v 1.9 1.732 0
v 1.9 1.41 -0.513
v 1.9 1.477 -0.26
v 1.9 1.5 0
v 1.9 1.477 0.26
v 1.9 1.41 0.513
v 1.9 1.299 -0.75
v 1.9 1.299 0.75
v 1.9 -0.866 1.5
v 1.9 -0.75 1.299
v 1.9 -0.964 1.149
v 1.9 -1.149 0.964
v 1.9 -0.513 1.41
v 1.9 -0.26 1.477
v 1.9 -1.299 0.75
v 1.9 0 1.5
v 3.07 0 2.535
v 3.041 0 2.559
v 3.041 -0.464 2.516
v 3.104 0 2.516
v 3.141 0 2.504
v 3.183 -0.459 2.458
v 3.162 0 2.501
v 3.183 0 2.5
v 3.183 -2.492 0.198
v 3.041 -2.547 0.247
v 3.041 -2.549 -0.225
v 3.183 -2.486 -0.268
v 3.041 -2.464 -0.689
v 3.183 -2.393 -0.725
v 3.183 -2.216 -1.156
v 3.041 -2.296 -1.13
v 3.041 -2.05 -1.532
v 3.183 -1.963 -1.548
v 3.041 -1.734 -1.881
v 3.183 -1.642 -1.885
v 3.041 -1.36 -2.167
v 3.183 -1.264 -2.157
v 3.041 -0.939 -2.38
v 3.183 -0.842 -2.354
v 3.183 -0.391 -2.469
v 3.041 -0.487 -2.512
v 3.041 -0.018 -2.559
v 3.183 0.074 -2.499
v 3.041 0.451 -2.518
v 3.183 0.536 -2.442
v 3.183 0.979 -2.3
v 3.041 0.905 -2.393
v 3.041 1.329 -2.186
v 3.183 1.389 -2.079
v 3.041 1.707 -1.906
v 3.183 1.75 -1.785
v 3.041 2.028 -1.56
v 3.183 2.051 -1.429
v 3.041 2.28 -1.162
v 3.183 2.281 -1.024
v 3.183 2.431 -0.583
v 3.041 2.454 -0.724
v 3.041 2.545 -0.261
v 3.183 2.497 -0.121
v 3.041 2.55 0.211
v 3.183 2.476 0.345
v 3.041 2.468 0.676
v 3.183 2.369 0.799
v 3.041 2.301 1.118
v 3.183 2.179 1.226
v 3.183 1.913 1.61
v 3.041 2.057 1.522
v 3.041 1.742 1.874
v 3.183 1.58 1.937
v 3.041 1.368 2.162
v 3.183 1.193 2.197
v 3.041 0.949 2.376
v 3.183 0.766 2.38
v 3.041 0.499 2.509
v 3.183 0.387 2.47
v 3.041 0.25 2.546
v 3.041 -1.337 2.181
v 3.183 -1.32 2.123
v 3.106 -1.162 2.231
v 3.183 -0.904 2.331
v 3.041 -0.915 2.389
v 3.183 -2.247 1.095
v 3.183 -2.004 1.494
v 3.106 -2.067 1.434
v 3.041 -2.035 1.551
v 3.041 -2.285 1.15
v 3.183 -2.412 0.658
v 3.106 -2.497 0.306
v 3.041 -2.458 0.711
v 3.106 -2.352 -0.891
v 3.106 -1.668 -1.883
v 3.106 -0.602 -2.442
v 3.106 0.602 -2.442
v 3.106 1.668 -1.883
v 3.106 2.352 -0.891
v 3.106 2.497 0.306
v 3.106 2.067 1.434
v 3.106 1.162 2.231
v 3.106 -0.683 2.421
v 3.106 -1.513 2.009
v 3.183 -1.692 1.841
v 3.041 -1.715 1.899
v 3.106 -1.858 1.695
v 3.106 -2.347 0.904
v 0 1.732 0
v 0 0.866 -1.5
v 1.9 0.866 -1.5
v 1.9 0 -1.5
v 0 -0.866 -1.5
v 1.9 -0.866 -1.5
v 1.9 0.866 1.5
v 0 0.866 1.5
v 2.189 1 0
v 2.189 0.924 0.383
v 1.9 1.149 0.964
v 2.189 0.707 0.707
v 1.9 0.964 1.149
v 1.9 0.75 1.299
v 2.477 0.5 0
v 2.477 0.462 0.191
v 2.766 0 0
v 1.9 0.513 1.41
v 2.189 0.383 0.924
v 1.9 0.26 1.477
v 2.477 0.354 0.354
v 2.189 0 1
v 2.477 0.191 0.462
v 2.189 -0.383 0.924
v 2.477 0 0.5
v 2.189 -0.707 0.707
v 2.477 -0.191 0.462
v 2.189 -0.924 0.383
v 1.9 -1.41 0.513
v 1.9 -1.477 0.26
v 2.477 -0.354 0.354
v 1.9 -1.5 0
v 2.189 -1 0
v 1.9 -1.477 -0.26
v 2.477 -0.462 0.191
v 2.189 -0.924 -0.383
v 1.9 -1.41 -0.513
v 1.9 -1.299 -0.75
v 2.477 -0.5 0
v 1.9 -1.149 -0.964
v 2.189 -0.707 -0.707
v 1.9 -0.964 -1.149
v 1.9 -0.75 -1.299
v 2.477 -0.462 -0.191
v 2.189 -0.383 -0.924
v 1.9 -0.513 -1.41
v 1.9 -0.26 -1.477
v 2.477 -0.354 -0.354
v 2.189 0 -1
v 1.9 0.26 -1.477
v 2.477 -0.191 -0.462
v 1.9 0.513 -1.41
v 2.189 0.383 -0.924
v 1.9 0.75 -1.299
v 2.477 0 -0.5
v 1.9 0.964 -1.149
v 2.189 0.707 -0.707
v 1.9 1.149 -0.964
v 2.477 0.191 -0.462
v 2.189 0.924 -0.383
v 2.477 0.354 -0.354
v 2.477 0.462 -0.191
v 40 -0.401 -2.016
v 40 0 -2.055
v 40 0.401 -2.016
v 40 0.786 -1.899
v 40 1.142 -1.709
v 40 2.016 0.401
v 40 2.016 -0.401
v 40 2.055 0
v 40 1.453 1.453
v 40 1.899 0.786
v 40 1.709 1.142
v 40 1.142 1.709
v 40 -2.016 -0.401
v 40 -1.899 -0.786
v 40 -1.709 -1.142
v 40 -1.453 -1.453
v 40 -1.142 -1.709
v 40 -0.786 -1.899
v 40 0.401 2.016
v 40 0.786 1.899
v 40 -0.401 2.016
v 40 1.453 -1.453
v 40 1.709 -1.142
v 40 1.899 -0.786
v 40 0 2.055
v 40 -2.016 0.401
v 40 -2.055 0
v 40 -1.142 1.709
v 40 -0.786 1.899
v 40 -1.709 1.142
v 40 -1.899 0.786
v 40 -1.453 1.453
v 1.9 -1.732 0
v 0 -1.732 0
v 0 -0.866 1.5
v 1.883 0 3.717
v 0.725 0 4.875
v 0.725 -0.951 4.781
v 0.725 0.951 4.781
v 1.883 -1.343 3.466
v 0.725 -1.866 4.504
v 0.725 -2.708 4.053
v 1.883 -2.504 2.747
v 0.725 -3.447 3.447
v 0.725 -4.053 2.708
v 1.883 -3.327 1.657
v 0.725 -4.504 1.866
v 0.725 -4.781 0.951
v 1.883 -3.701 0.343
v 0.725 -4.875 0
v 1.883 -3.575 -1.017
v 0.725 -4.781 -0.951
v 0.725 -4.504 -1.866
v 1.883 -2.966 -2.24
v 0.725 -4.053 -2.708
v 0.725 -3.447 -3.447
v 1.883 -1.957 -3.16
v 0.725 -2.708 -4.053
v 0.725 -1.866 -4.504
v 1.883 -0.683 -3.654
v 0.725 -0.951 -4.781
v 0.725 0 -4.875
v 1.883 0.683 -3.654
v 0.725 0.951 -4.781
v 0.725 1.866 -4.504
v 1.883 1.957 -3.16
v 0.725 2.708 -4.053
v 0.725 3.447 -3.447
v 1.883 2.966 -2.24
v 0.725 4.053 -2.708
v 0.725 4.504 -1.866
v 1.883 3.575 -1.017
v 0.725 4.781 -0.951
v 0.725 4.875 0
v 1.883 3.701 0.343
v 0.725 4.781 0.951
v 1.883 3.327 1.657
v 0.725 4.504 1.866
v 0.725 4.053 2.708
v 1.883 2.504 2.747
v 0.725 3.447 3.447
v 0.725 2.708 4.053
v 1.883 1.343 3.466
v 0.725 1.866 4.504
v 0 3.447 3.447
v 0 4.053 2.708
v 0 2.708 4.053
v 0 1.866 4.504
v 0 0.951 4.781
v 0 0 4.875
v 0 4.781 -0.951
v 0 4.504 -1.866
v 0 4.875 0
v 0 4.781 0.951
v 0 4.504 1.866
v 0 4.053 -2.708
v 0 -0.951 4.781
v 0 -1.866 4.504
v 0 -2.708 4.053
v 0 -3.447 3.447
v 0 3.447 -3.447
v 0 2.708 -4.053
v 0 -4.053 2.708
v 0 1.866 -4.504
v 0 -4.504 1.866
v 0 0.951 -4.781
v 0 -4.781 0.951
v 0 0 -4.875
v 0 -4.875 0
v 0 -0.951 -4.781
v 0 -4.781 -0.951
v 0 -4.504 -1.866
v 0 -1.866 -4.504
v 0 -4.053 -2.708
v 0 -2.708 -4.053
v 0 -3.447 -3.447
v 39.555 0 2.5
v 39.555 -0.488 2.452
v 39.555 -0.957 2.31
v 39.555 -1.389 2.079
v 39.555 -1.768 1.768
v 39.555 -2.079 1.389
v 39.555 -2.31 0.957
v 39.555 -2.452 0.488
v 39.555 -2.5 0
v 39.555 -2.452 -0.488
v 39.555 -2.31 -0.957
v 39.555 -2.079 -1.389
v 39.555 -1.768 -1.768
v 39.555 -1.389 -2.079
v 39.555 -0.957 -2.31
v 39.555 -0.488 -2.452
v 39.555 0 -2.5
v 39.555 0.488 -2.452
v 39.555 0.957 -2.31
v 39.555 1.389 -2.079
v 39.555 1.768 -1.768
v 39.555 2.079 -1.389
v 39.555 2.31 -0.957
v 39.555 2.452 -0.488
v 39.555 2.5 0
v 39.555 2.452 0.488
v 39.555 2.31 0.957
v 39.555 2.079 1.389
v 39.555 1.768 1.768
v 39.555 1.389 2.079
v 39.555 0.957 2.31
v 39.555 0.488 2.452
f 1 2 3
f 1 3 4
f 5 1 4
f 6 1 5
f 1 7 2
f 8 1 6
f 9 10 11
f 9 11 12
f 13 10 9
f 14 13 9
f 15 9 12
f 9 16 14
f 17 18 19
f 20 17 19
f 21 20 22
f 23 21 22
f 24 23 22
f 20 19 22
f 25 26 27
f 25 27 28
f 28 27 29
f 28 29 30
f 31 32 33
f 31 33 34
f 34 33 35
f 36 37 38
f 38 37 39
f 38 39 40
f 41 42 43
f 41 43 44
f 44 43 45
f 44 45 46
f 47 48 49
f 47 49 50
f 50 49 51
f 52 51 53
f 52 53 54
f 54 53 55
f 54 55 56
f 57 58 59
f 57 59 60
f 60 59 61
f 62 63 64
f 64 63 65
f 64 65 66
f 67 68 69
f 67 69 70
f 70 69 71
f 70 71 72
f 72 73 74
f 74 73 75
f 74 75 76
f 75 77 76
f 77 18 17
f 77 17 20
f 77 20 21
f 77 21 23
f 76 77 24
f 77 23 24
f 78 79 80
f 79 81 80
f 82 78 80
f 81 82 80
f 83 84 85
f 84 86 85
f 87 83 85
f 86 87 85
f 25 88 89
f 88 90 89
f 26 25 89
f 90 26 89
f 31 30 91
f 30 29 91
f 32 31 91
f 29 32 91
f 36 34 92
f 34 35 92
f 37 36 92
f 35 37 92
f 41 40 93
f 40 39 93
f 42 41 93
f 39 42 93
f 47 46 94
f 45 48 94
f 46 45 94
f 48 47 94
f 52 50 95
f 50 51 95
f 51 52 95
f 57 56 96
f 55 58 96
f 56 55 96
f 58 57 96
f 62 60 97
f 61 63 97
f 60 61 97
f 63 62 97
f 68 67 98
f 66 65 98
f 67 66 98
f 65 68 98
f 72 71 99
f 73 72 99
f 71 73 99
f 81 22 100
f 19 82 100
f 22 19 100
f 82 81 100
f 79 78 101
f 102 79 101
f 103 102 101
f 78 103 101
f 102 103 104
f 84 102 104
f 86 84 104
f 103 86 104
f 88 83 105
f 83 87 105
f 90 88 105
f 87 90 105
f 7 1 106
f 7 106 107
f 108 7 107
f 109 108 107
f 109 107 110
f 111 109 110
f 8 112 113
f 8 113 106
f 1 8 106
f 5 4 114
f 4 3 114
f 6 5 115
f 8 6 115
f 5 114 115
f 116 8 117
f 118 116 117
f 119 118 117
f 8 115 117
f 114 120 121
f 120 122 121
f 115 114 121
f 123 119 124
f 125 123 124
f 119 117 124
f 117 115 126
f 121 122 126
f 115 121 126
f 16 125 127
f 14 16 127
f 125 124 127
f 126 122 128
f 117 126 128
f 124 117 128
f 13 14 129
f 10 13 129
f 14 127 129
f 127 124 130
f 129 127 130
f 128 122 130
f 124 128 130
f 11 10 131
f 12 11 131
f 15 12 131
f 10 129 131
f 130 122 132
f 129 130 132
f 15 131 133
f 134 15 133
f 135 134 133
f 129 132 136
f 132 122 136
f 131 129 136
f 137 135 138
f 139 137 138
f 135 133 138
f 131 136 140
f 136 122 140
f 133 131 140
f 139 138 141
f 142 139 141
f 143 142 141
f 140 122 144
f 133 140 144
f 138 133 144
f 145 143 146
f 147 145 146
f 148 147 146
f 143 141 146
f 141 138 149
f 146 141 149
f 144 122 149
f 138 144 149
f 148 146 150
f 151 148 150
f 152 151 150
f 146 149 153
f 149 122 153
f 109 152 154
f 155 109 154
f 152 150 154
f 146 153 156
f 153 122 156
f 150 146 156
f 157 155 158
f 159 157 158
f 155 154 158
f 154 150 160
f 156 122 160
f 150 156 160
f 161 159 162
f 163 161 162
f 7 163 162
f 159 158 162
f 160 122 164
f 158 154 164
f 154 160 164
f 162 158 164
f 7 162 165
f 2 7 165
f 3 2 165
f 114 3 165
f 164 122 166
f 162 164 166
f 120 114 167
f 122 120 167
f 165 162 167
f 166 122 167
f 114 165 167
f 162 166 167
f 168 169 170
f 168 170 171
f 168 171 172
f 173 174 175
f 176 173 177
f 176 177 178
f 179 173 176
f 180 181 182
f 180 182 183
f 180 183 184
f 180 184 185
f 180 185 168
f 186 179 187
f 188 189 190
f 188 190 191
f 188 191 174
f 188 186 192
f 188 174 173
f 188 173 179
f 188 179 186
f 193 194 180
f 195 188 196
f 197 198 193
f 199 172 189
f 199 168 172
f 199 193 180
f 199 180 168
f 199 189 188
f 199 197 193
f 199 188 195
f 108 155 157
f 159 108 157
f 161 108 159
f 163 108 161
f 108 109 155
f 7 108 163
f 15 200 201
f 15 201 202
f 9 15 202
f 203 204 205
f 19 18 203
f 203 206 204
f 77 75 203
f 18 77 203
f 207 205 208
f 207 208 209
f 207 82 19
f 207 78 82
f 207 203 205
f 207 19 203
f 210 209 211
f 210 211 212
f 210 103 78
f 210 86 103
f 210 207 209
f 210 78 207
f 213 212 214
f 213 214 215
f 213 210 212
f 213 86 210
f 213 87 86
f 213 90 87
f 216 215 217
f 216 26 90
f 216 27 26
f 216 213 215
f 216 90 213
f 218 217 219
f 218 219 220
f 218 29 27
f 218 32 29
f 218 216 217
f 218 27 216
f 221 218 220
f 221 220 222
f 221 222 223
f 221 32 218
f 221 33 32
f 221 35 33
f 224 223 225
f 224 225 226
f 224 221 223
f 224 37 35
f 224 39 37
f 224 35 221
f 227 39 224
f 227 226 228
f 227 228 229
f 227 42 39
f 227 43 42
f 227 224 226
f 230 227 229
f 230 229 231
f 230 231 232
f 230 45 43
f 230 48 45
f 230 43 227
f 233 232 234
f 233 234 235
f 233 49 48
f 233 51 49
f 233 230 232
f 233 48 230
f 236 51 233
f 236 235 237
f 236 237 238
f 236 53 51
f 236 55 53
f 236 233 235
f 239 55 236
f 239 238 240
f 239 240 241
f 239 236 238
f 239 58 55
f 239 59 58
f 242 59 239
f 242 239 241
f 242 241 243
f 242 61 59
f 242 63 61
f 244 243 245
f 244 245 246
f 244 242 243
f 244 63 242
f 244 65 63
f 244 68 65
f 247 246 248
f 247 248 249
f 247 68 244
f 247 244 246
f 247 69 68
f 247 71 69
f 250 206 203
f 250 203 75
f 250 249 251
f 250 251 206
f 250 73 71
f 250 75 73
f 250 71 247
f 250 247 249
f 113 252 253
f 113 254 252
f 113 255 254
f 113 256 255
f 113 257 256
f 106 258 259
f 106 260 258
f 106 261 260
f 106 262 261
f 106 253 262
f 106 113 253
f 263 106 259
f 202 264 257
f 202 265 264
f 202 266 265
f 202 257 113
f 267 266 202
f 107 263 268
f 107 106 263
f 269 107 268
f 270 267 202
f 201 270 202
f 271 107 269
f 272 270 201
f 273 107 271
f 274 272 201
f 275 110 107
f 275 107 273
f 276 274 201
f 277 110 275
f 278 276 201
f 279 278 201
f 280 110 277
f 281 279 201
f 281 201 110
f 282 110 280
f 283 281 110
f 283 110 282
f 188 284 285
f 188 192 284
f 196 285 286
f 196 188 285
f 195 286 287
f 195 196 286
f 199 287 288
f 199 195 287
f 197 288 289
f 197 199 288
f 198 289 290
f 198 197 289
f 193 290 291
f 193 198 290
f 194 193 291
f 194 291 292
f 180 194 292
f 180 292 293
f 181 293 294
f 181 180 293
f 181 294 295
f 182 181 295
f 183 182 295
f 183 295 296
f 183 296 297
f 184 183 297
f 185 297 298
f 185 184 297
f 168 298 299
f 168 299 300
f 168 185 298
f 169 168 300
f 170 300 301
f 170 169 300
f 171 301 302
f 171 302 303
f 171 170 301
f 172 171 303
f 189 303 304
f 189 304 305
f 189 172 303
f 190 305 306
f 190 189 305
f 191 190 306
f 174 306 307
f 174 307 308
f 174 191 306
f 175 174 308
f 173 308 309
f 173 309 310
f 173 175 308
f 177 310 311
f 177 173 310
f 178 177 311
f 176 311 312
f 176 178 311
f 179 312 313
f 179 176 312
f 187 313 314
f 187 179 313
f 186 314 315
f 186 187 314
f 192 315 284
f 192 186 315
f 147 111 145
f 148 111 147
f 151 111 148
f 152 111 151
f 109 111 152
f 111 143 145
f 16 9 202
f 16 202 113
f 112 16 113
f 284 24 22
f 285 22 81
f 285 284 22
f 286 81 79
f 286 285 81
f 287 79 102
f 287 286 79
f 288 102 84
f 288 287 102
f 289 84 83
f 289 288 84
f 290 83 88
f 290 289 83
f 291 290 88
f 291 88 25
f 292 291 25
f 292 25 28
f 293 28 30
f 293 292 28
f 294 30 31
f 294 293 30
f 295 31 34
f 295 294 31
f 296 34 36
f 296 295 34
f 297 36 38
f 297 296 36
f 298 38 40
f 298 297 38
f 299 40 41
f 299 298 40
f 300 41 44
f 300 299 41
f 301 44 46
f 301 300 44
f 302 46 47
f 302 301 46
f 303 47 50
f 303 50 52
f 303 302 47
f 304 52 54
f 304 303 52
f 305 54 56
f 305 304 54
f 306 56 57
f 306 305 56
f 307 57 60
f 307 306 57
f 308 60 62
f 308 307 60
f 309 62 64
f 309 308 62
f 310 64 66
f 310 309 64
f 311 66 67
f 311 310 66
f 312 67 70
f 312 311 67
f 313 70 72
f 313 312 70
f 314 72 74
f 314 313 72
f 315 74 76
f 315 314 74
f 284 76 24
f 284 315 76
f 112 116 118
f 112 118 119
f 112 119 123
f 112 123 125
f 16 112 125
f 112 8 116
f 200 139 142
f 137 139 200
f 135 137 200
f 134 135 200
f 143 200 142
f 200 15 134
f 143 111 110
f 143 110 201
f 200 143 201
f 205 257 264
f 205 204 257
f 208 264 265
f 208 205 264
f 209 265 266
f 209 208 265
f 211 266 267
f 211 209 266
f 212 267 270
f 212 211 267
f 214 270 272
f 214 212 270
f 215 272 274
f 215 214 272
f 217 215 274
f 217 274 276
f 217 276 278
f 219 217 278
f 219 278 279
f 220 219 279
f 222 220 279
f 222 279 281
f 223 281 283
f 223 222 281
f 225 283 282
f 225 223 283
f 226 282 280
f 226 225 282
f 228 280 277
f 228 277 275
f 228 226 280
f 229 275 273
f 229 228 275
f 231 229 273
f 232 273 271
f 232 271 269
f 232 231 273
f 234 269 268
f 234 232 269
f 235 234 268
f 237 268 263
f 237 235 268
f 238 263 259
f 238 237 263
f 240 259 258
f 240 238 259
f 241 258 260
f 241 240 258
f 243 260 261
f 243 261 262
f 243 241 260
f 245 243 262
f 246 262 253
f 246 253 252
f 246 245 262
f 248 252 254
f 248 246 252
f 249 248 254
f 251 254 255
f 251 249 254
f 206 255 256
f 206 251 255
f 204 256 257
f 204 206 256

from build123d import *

# Parameters (mm, degrees)
FILLET1_R   = 0.2
HEX_START   = -1.9
HEX_2_DEPTH = 1.9


with BuildPart() as part:
    # BodySke → BaseBody (revolve)
    with BuildSketch(Plane.XY, mode=Mode.PRIVATE) as basebody_sk:
        Polygon((0, 0), (0, 4.875), (0.725, 4.875), (3.1, 2.5), (39.555, 2.5), (40, 2.055), (40, 0), align=None)
    revolve(basebody_sk.sketch.rotate(Axis((0, 0, 0), (1, 0, 0)), 90), axis=Axis((0, 0, 0), (1, 0, 0)))

    # Fillet1
    fillet1_edges = [part.edges().sort_by_distance(p)[0] for p in [
        (3.1, 0, -2.5),
    ]]
    fillet(fillet1_edges, radius=FILLET1_R)

    # Hex 2: read off the stored shape, not the designer's step
    # Hex 2 outline → Hex 2 (cut)
    with BuildSketch(Plane.ZY.offset(HEX_START)):
        Polygon((-1.5, -0.866025404), (0, -1.732050808), (1.5, -0.866025404), (1.5, 0.866025404), (0, 1.732050808), (-1.5, 0.866025404), align=None)
    extrude(amount=HEX_2_DEPTH, mode=Mode.SUBTRACT)

    # Hex 2 2 outline → Hex 2 2 (revolve, cut)
    with BuildSketch(Plane.YX):
        Polygon((1.5, 1.9), (0, 2.766025404), (0, 1.9), align=None)
    revolve(axis=Axis((0, 0, 0), (1, 0, 0)), mode=Mode.SUBTRACT)


solid = part.part
